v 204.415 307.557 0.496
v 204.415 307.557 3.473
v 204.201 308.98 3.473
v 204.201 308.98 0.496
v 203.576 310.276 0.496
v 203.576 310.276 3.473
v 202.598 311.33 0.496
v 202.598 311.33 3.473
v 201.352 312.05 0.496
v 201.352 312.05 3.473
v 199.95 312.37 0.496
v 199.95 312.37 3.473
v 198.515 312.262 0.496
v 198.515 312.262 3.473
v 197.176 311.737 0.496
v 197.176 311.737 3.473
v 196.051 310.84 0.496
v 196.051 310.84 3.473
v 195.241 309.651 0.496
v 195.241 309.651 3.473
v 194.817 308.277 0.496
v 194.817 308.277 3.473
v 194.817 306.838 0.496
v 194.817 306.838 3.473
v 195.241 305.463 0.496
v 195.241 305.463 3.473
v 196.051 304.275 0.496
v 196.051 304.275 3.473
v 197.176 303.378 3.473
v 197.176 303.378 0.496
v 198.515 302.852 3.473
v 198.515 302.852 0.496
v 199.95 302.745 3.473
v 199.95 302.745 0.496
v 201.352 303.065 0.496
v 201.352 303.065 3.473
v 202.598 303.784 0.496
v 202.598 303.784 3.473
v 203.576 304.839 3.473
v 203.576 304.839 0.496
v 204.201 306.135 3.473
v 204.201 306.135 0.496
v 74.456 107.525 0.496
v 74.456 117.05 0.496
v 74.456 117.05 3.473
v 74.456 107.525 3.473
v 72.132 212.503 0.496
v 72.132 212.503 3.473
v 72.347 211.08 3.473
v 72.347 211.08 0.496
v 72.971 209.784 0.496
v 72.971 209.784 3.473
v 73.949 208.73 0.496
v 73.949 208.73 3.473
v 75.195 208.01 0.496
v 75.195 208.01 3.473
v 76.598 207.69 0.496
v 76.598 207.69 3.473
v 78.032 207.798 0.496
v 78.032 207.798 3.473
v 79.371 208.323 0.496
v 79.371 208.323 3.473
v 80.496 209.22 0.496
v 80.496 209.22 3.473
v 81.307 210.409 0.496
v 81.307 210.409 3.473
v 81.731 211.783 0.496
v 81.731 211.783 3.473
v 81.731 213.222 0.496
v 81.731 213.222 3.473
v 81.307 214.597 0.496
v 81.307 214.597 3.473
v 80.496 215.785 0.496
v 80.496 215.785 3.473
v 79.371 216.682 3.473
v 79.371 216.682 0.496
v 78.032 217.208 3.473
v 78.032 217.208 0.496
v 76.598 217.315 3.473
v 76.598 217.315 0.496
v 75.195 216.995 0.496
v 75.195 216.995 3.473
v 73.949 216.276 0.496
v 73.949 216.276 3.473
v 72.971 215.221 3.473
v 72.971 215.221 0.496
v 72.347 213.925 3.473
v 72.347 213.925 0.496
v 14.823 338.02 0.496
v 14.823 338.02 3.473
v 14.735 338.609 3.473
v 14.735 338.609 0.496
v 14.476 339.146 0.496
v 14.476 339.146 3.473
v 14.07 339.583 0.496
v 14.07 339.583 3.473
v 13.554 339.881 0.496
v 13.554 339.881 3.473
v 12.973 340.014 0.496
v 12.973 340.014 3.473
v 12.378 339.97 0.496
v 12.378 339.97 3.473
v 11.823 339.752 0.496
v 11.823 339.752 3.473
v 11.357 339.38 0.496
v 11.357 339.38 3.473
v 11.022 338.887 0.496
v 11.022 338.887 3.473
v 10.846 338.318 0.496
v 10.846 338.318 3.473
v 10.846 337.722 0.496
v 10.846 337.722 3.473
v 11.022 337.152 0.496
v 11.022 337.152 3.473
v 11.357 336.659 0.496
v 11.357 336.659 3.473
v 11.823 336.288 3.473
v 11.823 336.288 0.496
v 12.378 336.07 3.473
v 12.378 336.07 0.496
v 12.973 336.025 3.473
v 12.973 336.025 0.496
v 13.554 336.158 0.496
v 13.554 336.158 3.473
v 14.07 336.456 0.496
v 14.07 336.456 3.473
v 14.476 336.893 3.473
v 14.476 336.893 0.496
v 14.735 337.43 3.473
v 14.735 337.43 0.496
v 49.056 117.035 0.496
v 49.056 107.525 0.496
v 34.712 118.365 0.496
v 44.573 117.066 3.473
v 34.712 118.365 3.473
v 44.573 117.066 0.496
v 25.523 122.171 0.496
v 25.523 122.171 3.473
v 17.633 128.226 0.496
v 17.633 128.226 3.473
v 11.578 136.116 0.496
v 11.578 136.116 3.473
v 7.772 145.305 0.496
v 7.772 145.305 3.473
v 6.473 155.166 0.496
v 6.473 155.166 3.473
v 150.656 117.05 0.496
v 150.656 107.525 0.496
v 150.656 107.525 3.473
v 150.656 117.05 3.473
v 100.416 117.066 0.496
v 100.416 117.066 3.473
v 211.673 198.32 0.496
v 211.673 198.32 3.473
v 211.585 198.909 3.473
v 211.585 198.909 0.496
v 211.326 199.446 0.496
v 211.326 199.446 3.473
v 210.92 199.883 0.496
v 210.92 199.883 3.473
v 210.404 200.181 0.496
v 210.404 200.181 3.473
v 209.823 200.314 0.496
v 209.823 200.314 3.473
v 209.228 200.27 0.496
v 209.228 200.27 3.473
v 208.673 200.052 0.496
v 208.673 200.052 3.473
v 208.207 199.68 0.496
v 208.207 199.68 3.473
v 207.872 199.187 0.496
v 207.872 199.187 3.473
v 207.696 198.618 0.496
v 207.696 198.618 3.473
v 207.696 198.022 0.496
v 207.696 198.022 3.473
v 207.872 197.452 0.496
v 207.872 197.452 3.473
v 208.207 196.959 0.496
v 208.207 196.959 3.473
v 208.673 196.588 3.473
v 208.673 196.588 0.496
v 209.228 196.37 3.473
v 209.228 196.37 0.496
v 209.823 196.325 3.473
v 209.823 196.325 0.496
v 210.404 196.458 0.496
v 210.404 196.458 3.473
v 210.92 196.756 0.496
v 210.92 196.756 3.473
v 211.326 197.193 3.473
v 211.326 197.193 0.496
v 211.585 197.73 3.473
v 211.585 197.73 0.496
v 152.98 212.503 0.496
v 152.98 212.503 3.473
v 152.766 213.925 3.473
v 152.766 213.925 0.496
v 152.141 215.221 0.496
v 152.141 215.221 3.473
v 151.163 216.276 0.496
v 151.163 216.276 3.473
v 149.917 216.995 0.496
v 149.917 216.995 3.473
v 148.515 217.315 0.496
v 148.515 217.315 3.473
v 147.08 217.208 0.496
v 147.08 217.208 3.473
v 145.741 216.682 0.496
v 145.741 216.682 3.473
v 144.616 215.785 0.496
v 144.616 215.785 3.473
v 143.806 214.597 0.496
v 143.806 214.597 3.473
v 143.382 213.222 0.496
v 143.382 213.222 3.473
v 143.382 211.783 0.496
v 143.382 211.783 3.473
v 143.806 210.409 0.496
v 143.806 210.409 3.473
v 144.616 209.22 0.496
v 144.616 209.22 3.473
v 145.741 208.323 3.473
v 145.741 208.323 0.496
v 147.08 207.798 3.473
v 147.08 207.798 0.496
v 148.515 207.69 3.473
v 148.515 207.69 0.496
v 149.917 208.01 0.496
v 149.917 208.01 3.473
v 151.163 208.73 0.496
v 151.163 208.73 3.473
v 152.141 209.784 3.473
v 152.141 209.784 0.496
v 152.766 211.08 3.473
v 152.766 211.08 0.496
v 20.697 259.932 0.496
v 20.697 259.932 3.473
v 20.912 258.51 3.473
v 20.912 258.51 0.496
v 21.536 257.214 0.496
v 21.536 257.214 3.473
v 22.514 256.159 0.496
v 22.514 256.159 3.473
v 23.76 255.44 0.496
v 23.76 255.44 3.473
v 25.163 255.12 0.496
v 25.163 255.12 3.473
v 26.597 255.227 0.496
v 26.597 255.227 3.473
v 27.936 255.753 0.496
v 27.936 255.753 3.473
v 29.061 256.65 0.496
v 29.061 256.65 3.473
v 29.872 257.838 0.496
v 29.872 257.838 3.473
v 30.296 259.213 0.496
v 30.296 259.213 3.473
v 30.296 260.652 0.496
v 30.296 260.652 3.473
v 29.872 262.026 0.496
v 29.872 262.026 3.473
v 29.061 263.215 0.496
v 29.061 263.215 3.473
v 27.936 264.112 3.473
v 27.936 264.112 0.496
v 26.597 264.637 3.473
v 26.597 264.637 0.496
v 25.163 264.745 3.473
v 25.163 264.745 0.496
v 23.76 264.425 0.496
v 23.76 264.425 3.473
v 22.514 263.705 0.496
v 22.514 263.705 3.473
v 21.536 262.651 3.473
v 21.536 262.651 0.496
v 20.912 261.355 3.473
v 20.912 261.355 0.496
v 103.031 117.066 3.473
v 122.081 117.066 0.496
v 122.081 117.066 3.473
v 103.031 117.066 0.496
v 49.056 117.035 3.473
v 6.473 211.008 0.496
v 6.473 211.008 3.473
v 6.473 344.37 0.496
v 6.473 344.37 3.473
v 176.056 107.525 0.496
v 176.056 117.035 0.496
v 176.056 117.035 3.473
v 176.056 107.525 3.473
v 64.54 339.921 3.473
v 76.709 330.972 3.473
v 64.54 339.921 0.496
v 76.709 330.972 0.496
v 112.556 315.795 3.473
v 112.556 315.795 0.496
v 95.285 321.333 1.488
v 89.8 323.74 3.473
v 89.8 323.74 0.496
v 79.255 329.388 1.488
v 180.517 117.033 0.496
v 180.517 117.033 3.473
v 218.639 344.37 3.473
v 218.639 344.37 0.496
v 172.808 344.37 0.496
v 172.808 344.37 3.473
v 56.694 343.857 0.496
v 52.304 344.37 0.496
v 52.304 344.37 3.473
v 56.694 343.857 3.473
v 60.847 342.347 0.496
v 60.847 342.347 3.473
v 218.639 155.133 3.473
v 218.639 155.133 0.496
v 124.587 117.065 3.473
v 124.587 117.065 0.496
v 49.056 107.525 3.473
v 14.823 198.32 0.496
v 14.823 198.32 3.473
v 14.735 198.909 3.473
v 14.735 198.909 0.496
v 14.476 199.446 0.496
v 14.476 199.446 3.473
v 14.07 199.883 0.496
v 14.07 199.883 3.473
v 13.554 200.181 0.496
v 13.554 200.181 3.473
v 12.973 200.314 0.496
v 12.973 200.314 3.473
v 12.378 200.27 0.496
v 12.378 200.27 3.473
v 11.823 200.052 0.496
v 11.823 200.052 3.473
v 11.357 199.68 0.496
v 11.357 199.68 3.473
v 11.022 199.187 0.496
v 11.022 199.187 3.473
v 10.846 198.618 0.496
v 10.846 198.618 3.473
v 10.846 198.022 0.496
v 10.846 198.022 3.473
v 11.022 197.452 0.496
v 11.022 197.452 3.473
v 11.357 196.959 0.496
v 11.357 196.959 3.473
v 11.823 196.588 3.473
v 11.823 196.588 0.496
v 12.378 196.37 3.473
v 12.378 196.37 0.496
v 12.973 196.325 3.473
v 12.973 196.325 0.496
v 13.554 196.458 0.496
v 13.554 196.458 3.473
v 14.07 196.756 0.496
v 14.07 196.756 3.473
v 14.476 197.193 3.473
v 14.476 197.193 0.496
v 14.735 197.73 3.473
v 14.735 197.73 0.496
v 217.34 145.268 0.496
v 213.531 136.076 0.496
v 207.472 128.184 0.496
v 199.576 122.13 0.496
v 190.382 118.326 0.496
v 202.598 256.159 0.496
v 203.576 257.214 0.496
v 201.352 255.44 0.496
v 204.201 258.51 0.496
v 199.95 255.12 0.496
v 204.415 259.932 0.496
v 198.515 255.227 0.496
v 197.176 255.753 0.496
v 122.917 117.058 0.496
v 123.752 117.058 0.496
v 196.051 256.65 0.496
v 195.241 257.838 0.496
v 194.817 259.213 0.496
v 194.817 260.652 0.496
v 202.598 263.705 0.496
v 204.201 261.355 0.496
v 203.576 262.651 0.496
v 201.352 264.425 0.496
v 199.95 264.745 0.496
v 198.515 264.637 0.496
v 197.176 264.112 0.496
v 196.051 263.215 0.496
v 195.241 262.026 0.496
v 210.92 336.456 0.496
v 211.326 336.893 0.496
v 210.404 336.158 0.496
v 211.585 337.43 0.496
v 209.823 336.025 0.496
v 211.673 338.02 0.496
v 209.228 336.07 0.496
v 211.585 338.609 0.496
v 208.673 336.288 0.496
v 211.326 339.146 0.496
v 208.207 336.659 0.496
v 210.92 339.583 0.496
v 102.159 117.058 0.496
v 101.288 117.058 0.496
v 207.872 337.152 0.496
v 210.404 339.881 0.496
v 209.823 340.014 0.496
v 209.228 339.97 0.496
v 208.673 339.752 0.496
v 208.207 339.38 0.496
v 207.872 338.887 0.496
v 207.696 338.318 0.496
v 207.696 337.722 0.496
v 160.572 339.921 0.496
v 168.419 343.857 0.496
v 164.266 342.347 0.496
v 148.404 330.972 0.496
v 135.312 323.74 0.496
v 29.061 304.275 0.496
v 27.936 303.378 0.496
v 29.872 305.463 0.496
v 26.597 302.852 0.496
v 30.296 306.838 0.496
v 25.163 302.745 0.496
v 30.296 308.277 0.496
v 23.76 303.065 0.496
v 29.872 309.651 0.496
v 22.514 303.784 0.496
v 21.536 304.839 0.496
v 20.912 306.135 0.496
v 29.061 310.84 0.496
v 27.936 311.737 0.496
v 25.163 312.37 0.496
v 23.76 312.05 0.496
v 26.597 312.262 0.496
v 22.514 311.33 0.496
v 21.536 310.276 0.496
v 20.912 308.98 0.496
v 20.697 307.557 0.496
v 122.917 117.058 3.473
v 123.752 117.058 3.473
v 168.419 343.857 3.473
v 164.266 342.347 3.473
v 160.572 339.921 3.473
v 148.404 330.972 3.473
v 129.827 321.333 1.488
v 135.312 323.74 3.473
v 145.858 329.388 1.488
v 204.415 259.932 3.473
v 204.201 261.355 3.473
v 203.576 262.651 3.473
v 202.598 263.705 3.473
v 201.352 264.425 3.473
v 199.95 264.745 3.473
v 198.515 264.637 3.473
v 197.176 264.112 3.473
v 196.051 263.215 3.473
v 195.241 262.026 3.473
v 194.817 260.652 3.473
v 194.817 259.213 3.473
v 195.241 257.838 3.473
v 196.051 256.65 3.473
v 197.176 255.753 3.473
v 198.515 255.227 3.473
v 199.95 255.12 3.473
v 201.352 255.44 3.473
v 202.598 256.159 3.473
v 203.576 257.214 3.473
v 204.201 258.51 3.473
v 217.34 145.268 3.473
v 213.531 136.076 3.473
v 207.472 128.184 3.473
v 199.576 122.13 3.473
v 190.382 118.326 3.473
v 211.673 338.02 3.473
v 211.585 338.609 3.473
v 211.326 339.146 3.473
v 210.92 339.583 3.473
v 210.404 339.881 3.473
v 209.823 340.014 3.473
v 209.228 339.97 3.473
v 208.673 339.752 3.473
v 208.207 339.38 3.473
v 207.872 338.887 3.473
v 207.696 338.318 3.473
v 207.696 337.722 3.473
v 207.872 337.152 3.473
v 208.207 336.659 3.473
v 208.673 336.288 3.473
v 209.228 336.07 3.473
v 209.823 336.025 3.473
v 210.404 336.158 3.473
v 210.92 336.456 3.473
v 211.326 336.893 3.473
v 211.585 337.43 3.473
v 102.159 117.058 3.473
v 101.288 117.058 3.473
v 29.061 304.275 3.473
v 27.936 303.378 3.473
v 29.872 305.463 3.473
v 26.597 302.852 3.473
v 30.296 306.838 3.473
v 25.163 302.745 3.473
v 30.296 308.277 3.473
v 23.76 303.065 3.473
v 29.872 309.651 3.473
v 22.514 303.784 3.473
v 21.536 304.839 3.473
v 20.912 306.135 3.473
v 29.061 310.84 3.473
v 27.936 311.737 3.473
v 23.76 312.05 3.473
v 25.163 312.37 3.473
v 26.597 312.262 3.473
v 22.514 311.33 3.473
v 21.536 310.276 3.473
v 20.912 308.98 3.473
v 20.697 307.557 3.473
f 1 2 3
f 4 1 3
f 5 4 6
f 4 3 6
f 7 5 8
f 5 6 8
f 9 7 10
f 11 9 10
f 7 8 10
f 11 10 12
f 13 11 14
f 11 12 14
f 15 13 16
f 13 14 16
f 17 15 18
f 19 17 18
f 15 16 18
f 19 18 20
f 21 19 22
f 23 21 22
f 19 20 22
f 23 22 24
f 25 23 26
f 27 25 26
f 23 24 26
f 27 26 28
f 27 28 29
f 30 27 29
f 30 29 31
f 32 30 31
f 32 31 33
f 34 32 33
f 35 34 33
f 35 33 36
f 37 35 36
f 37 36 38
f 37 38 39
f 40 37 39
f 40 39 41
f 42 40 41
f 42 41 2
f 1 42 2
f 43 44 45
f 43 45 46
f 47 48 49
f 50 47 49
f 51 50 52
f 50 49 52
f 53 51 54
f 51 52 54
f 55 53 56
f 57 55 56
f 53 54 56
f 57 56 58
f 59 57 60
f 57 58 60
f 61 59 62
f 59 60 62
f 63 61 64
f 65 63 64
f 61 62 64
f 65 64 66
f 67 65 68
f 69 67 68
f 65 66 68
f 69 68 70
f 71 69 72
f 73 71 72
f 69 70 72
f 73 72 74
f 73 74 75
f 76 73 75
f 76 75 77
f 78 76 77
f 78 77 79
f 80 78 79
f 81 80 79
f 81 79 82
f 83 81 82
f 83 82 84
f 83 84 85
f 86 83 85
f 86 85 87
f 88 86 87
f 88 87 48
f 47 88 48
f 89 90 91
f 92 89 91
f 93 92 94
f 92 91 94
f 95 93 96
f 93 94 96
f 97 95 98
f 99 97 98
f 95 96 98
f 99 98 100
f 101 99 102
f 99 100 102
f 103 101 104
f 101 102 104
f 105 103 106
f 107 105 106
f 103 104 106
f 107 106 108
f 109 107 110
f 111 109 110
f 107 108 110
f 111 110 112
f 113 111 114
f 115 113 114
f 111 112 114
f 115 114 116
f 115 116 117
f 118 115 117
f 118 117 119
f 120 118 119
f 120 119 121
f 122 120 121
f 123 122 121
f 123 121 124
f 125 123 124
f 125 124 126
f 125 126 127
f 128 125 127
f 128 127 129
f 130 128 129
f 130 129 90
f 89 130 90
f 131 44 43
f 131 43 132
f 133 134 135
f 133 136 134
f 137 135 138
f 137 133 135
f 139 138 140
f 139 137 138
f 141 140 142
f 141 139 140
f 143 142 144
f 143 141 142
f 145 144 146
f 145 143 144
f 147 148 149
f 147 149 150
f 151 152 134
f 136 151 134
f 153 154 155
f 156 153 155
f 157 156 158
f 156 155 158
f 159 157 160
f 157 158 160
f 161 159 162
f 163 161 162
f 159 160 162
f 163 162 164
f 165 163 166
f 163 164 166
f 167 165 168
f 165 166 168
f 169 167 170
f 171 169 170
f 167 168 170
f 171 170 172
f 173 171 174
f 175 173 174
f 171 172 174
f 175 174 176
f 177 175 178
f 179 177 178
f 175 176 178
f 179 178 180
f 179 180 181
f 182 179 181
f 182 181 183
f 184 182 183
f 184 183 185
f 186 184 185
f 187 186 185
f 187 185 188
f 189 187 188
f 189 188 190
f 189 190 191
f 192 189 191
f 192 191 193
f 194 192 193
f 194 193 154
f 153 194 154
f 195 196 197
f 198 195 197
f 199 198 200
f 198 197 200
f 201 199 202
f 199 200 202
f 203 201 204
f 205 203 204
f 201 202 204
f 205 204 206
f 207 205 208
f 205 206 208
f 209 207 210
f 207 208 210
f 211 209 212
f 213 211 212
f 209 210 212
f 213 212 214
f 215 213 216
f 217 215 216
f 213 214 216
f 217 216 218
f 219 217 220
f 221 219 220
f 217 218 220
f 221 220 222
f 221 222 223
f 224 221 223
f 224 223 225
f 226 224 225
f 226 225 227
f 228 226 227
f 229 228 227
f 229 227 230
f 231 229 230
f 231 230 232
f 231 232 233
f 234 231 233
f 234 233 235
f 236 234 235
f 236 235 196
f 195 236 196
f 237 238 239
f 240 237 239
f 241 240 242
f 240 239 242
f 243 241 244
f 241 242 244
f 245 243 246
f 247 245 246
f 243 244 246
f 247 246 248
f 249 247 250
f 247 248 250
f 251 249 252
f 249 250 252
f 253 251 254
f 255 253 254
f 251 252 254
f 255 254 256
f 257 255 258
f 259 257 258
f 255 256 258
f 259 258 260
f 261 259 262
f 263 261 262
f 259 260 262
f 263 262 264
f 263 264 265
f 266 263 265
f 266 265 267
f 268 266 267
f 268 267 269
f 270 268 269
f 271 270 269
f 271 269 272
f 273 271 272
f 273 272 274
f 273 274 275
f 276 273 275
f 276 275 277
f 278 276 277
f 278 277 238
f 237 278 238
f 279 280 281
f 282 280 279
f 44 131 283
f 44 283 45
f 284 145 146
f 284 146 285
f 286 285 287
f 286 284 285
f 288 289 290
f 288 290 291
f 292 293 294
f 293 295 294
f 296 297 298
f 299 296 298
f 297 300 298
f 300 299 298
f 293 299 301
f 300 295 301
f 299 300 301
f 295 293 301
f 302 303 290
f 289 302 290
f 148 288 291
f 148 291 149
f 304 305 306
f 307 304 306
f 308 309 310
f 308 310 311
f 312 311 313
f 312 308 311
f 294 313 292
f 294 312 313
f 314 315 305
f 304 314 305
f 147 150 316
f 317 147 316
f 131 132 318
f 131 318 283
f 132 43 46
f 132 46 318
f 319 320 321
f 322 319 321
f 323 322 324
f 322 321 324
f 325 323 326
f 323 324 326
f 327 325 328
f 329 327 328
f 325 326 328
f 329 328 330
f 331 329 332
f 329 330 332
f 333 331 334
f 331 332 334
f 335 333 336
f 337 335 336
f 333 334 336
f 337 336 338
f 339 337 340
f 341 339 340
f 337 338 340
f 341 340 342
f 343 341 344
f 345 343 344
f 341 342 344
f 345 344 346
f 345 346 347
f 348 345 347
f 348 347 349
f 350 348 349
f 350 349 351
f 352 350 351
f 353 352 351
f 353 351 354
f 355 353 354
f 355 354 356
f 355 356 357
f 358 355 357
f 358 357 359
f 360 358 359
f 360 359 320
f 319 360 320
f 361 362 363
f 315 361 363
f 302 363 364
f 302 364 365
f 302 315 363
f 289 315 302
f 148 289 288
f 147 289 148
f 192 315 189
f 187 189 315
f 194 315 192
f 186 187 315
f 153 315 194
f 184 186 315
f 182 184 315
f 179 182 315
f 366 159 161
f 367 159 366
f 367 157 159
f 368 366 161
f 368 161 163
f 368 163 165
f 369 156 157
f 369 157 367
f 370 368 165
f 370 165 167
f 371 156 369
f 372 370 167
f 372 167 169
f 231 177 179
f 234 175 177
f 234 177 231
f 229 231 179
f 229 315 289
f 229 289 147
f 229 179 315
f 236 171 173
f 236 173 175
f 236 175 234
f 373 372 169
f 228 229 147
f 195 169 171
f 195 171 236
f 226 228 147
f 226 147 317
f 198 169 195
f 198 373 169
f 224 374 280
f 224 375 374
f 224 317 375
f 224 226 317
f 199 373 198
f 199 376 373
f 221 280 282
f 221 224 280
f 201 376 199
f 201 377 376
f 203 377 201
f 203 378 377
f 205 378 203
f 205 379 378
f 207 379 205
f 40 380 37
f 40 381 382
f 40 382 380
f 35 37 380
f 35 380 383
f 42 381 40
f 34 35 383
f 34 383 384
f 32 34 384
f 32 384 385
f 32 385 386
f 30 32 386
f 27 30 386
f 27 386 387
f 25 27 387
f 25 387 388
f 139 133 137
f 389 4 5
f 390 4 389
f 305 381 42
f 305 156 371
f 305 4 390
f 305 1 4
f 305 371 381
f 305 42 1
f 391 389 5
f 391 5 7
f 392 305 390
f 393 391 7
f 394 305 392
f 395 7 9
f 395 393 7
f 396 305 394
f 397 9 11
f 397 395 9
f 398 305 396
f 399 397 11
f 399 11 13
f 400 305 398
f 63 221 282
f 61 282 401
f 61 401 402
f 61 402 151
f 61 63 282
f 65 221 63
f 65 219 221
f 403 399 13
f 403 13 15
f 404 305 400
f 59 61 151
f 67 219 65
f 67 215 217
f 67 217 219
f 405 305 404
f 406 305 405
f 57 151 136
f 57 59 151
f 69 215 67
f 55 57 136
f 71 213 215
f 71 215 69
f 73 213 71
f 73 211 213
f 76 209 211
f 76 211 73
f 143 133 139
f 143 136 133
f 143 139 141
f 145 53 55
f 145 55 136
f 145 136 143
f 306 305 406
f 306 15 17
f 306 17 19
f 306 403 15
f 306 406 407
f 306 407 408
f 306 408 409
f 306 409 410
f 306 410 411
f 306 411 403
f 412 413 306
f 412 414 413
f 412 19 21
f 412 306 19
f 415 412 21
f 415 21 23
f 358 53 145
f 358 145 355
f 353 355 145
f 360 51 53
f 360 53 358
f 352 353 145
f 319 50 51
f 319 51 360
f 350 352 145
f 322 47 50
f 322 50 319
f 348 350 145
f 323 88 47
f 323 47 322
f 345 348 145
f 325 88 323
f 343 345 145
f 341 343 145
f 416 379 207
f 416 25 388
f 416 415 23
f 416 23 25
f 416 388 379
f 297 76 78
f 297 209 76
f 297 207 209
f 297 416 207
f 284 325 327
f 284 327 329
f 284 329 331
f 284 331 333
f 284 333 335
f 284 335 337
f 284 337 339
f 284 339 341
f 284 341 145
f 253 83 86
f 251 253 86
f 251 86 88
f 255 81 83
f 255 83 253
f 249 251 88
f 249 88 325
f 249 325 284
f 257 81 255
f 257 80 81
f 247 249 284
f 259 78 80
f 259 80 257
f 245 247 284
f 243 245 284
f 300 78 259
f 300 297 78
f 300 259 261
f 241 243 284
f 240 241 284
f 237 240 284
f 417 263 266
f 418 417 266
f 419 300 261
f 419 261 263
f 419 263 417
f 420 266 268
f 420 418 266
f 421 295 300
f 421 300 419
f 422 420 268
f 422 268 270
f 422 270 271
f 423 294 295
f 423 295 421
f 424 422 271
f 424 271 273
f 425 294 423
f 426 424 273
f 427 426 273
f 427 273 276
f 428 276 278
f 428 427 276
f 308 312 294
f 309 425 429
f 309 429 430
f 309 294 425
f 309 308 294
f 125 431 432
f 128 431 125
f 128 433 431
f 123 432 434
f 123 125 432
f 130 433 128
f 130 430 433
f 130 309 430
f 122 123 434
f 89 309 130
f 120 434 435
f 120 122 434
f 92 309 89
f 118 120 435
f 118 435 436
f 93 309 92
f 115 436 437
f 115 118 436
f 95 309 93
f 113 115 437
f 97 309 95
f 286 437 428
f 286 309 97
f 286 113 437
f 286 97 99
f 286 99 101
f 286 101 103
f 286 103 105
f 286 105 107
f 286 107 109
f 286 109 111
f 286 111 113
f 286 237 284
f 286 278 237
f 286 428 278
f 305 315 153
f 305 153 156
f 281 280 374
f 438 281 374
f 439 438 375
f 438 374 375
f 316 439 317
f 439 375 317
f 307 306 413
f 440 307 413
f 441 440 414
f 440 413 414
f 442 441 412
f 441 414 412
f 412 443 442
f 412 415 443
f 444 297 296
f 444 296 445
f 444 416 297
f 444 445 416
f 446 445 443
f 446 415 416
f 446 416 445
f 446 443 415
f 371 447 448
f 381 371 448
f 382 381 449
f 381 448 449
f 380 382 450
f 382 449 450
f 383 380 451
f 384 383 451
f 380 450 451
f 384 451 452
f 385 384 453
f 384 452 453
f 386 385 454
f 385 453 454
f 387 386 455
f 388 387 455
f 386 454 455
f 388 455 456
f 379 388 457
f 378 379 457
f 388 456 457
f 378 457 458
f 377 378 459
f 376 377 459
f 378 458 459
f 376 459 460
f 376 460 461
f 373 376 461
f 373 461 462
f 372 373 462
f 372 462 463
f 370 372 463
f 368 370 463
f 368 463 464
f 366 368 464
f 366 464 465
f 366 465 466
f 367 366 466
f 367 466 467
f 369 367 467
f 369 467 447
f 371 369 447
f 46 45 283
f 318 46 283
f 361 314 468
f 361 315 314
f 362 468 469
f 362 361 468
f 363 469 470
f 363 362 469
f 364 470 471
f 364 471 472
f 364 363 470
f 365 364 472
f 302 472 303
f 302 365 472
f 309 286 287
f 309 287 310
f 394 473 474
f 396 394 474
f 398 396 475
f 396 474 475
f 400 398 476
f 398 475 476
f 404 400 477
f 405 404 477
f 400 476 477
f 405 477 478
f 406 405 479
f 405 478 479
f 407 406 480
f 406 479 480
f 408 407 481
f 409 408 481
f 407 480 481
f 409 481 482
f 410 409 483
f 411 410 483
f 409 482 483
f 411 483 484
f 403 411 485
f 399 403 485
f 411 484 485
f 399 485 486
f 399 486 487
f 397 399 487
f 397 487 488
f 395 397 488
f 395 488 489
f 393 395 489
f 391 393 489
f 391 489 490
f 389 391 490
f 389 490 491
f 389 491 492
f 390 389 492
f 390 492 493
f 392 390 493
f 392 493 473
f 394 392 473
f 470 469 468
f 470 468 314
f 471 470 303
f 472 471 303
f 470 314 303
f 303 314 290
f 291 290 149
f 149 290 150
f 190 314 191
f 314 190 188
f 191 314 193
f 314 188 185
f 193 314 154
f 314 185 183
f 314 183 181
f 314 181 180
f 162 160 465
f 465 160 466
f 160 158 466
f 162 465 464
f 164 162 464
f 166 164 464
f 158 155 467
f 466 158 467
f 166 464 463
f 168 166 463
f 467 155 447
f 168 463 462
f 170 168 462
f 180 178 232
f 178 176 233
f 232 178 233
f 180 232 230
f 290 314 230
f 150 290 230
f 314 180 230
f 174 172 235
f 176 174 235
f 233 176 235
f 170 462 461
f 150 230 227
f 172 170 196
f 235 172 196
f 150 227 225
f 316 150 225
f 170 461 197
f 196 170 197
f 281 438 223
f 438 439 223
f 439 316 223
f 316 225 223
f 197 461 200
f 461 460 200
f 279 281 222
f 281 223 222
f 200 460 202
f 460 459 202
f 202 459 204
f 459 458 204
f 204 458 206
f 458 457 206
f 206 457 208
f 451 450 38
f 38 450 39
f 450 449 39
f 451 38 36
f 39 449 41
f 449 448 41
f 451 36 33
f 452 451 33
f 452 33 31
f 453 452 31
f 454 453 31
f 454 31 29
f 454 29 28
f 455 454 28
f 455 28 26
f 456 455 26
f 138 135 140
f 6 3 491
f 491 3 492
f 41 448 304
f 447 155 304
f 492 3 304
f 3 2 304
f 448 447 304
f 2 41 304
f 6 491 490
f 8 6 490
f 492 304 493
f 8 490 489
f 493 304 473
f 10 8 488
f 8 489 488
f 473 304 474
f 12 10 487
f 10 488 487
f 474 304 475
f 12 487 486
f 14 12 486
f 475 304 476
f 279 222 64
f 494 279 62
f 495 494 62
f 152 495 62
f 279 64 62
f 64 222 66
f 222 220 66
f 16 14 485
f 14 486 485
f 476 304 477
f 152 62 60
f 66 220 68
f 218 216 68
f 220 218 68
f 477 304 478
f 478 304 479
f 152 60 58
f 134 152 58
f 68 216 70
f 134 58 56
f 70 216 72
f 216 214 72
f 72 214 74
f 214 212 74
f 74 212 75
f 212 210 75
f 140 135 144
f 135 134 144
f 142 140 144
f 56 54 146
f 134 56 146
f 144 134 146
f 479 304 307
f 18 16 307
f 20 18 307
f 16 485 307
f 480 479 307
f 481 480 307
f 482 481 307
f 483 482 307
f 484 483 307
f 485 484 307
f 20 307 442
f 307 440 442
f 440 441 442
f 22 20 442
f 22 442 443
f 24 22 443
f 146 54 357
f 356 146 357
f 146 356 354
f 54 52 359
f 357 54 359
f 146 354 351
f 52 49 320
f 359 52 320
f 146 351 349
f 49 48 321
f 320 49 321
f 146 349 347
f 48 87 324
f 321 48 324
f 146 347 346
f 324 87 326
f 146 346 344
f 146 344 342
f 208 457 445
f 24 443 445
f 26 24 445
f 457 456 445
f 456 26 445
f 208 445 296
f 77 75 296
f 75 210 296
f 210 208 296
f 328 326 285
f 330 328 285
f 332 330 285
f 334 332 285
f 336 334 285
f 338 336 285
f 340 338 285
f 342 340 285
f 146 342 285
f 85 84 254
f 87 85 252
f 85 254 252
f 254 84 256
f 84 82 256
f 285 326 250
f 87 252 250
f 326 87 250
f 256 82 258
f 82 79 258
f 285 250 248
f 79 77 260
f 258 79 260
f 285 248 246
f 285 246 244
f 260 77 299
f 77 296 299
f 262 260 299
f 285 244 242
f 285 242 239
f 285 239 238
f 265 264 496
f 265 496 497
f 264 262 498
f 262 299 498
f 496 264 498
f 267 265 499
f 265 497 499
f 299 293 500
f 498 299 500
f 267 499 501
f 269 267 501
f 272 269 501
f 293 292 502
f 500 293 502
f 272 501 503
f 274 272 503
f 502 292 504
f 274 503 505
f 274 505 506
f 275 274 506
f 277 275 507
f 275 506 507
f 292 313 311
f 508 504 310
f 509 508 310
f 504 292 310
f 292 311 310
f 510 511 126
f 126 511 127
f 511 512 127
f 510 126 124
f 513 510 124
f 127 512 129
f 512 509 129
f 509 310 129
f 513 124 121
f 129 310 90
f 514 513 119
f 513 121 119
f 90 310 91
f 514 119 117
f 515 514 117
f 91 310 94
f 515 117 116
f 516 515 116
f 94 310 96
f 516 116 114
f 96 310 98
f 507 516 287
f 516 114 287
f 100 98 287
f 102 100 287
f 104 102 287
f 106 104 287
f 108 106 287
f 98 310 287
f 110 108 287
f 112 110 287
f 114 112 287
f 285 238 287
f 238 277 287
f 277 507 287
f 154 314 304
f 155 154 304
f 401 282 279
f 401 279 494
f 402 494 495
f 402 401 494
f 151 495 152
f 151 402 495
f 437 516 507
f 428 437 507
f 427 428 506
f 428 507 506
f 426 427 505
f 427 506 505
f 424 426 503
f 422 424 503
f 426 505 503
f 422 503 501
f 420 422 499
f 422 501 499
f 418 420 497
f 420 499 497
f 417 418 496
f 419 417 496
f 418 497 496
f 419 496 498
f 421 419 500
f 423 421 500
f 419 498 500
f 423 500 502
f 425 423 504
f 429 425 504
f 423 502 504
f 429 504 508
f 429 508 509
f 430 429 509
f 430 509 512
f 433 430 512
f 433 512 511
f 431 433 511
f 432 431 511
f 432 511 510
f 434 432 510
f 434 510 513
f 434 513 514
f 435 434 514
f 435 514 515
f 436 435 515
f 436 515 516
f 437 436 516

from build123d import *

# Parameters (mm, degrees)
BOSS_EXTRUDE1_DEPTH = 3.96875
SKETCH2_R           = 6.434666667
CUT_EXTRUDE1_DEPTH  = 458.934661801
SCALE1_SCALE        = 0.75
SKETCH3_R           = 2
CUT_EXTRUDE2_DEPTH  = 408.924502354
BOSS_EXTRUDE2_START = -2.9765625
BOSS_EXTRUDE2_DEPTH = 2.9765625
BOSS_EXTRUDE3_DEPTH = 2.9765625
FILLET1_R           = 38.1


# Read off the part's stored shape, not the designer's step: Boss-Extrude2
with BuildPart() as part:
    # Sketch1 → Boss-Extrude1 (new body)
    with BuildSketch(Plane.XY):
        with BuildLine():
            ThreePointArc((125.256263701, 77.943736299), (215.569553449, 113.908167327), (254, 203.2))
            Line((254, 203.2), (254, 304.814964765))
            Line((254, 304.814964765), (254, 381.014964765))
            Line((254, 381.014964765), (192.892022849, 381.014964765))
            ThreePointArc((192.892022849, 381.014964765), (184.21229846, 379.485917501), (176.577590515, 375.082869059))
            add(Edge.make_bspline(
                [(112.556263701, 342.914964765), (136.377690637, 348.603107697), (157.869028788, 359.404778612), (176.577590515, 375.082869059)],
                knots=[0, 0, 0, 0, 0.891694809, 0.891694809, 0.891694809, 0.891694809], degree=3))
            Line((112.556263701, 342.914964765), (112.556263701, 304.814964765))
            Line((112.556263701, 304.814964765), (112.556263701, 77.943736299))
            Line((112.556263701, 77.943736299), (125.256263701, 77.943736299))
        make_face()
    boss_extrude1 = extrude(amount=BOSS_EXTRUDE1_DEPTH)

    # Mirror1: Boss-Extrude1 across plane
    add(boss_extrude1.mirror(Plane(origin=(112.556263701, 0, 3.96875), x_dir=(0, 0, 1), z_dir=(-1, 0, 0))))

    # Sketch2 → Cut-Extrude1 (cut, through all)
    with BuildSketch(Plane.XY.offset(3.96875)):
        with Locations((228.6, 331.931765933)):
            Circle(SKETCH2_R)
        with Locations((228.6, 268.431765933)):
            Circle(SKETCH2_R)
        with Locations((160.02, 205.192231498)):
            Circle(SKETCH2_R)
        with Locations(Location((65.092527401, 205.192231498, 0), (0, 0, 180))):
            Circle(SKETCH2_R)
        with Locations(Location((-3.487472599, 268.431765933, 0), (0, 0, 180))):
            Circle(SKETCH2_R)
        with Locations(Location((-3.487472599, 331.931765933, 0), (0, 0, 180))):
            Circle(SKETCH2_R)
    extrude(amount=-CUT_EXTRUDE1_DEPTH, mode=Mode.SUBTRACT)


with BuildPart() as part_1:
    # Scale1: scaled about (112.556263701, 234.433953078, 1.984375)
    add(part.part.scale(SCALE1_SCALE).moved(Location((28.139065925, 58.60848827, 0.49609375))))

    # Sketch3 → Cut-Extrude2 (cut, through all)
    with BuildSketch(Plane.XY.offset(3.47265625)):
        with Locations((12.823461476, 338.01970885)):
            Circle(SKETCH3_R)
        with Locations((209.673461476, 338.01970885)):
            Circle(SKETCH3_R)
        with Locations((209.673461476, 198.31970885)):
            Circle(SKETCH3_R)
        with Locations((12.823461476, 198.31970885)):
            Circle(SKETCH3_R)
    extrude(amount=-CUT_EXTRUDE2_DEPTH, mode=Mode.SUBTRACT)


with BuildPart() as boss_extrude2_tool:
    # Boss-Extrude2 outline → Boss-Extrude2 (new body)
    with BuildSketch(Plane(origin=(0, 0, 0.49609375), x_dir=(-1, 0, 0), z_dir=(0, 0, -1)).offset(BOSS_EXTRUDE2_START)):
        with BuildLine():
            ThreePointArc((-6.473461476, 211.008485276), (-34.365192323, 144.958018347), (-100.415659252, 117.066287501))
            Line((-100.415659252, 117.066287501), (-6.473461476, 117.066287501))
            Line((-6.473461476, 117.066287501), (-6.473461476, 211.008485276))
        make_face()
        with BuildLine():
            Line((-218.639065925, 211.008485276), (-218.639065925, 117.01064714))
            Line((-218.639065925, 117.01064714), (-124.58709381, 117.064843544))
            ThreePointArc((-124.58709381, 117.064843544), (-190.708509448, 144.919215083), (-218.639065925, 211.008485276))
        make_face()
    extrude(amount=BOSS_EXTRUDE2_DEPTH)


with BuildPart() as part_2:
    add(part_1.part)


with BuildPart() as part_3:
    # Boss-Extrude2: joined with boss_extrude2_tool
    add(part_2.part.fuse(boss_extrude2_tool.part, tol=0.00001))

    # Sketch5 → Boss-Extrude3 (add)
    with BuildSketch(Plane(origin=(0, 0, 0.49609375), x_dir=(-1, 0, 0), z_dir=(0, 0, -1))):
        Polygon((-150.656260143, 107.524821477), (-150.656260143, 117.049821477), (-176.056260143, 117.035185009), (-176.056260143, 107.524821477), align=None)
        Polygon((-49.056267259, 117.035185009), (-74.456267259, 117.049821477), (-74.456267259, 107.524821477), (-49.056267259, 107.524821477), align=None)
    extrude(amount=-BOSS_EXTRUDE3_DEPTH)


with BuildPart() as boss_extrude3_piece_1:
    # of the separate pieces the step leaves, piece 1, a body of its own (boss_extrude3_pieces)
    add(part_3.part.solids().sort_by_distance((122.081263701, 117.066290494, 0.49609375))[0])

    # Fillet1
    fillet1_edges = [boss_extrude3_piece_1.edges().sort_by_distance(p)[0] for p in [
        (218.639065925, 117.01064714, 1.984375),
        (6.473461476, 117.066287501, 1.984375),
    ]]
    fillet(fillet1_edges, radius=FILLET1_R)


with BuildPart() as boss_extrude3_piece_2:
    # of the separate pieces the step leaves, piece 2, a body of its own (boss_extrude3_pieces)
    add(part_3.part.solids().sort_by_distance((49.056267259, 117.035185009, 0.49609375))[0])


solid = Compound([boss_extrude3_piece_1.part, boss_extrude3_piece_2.part])
